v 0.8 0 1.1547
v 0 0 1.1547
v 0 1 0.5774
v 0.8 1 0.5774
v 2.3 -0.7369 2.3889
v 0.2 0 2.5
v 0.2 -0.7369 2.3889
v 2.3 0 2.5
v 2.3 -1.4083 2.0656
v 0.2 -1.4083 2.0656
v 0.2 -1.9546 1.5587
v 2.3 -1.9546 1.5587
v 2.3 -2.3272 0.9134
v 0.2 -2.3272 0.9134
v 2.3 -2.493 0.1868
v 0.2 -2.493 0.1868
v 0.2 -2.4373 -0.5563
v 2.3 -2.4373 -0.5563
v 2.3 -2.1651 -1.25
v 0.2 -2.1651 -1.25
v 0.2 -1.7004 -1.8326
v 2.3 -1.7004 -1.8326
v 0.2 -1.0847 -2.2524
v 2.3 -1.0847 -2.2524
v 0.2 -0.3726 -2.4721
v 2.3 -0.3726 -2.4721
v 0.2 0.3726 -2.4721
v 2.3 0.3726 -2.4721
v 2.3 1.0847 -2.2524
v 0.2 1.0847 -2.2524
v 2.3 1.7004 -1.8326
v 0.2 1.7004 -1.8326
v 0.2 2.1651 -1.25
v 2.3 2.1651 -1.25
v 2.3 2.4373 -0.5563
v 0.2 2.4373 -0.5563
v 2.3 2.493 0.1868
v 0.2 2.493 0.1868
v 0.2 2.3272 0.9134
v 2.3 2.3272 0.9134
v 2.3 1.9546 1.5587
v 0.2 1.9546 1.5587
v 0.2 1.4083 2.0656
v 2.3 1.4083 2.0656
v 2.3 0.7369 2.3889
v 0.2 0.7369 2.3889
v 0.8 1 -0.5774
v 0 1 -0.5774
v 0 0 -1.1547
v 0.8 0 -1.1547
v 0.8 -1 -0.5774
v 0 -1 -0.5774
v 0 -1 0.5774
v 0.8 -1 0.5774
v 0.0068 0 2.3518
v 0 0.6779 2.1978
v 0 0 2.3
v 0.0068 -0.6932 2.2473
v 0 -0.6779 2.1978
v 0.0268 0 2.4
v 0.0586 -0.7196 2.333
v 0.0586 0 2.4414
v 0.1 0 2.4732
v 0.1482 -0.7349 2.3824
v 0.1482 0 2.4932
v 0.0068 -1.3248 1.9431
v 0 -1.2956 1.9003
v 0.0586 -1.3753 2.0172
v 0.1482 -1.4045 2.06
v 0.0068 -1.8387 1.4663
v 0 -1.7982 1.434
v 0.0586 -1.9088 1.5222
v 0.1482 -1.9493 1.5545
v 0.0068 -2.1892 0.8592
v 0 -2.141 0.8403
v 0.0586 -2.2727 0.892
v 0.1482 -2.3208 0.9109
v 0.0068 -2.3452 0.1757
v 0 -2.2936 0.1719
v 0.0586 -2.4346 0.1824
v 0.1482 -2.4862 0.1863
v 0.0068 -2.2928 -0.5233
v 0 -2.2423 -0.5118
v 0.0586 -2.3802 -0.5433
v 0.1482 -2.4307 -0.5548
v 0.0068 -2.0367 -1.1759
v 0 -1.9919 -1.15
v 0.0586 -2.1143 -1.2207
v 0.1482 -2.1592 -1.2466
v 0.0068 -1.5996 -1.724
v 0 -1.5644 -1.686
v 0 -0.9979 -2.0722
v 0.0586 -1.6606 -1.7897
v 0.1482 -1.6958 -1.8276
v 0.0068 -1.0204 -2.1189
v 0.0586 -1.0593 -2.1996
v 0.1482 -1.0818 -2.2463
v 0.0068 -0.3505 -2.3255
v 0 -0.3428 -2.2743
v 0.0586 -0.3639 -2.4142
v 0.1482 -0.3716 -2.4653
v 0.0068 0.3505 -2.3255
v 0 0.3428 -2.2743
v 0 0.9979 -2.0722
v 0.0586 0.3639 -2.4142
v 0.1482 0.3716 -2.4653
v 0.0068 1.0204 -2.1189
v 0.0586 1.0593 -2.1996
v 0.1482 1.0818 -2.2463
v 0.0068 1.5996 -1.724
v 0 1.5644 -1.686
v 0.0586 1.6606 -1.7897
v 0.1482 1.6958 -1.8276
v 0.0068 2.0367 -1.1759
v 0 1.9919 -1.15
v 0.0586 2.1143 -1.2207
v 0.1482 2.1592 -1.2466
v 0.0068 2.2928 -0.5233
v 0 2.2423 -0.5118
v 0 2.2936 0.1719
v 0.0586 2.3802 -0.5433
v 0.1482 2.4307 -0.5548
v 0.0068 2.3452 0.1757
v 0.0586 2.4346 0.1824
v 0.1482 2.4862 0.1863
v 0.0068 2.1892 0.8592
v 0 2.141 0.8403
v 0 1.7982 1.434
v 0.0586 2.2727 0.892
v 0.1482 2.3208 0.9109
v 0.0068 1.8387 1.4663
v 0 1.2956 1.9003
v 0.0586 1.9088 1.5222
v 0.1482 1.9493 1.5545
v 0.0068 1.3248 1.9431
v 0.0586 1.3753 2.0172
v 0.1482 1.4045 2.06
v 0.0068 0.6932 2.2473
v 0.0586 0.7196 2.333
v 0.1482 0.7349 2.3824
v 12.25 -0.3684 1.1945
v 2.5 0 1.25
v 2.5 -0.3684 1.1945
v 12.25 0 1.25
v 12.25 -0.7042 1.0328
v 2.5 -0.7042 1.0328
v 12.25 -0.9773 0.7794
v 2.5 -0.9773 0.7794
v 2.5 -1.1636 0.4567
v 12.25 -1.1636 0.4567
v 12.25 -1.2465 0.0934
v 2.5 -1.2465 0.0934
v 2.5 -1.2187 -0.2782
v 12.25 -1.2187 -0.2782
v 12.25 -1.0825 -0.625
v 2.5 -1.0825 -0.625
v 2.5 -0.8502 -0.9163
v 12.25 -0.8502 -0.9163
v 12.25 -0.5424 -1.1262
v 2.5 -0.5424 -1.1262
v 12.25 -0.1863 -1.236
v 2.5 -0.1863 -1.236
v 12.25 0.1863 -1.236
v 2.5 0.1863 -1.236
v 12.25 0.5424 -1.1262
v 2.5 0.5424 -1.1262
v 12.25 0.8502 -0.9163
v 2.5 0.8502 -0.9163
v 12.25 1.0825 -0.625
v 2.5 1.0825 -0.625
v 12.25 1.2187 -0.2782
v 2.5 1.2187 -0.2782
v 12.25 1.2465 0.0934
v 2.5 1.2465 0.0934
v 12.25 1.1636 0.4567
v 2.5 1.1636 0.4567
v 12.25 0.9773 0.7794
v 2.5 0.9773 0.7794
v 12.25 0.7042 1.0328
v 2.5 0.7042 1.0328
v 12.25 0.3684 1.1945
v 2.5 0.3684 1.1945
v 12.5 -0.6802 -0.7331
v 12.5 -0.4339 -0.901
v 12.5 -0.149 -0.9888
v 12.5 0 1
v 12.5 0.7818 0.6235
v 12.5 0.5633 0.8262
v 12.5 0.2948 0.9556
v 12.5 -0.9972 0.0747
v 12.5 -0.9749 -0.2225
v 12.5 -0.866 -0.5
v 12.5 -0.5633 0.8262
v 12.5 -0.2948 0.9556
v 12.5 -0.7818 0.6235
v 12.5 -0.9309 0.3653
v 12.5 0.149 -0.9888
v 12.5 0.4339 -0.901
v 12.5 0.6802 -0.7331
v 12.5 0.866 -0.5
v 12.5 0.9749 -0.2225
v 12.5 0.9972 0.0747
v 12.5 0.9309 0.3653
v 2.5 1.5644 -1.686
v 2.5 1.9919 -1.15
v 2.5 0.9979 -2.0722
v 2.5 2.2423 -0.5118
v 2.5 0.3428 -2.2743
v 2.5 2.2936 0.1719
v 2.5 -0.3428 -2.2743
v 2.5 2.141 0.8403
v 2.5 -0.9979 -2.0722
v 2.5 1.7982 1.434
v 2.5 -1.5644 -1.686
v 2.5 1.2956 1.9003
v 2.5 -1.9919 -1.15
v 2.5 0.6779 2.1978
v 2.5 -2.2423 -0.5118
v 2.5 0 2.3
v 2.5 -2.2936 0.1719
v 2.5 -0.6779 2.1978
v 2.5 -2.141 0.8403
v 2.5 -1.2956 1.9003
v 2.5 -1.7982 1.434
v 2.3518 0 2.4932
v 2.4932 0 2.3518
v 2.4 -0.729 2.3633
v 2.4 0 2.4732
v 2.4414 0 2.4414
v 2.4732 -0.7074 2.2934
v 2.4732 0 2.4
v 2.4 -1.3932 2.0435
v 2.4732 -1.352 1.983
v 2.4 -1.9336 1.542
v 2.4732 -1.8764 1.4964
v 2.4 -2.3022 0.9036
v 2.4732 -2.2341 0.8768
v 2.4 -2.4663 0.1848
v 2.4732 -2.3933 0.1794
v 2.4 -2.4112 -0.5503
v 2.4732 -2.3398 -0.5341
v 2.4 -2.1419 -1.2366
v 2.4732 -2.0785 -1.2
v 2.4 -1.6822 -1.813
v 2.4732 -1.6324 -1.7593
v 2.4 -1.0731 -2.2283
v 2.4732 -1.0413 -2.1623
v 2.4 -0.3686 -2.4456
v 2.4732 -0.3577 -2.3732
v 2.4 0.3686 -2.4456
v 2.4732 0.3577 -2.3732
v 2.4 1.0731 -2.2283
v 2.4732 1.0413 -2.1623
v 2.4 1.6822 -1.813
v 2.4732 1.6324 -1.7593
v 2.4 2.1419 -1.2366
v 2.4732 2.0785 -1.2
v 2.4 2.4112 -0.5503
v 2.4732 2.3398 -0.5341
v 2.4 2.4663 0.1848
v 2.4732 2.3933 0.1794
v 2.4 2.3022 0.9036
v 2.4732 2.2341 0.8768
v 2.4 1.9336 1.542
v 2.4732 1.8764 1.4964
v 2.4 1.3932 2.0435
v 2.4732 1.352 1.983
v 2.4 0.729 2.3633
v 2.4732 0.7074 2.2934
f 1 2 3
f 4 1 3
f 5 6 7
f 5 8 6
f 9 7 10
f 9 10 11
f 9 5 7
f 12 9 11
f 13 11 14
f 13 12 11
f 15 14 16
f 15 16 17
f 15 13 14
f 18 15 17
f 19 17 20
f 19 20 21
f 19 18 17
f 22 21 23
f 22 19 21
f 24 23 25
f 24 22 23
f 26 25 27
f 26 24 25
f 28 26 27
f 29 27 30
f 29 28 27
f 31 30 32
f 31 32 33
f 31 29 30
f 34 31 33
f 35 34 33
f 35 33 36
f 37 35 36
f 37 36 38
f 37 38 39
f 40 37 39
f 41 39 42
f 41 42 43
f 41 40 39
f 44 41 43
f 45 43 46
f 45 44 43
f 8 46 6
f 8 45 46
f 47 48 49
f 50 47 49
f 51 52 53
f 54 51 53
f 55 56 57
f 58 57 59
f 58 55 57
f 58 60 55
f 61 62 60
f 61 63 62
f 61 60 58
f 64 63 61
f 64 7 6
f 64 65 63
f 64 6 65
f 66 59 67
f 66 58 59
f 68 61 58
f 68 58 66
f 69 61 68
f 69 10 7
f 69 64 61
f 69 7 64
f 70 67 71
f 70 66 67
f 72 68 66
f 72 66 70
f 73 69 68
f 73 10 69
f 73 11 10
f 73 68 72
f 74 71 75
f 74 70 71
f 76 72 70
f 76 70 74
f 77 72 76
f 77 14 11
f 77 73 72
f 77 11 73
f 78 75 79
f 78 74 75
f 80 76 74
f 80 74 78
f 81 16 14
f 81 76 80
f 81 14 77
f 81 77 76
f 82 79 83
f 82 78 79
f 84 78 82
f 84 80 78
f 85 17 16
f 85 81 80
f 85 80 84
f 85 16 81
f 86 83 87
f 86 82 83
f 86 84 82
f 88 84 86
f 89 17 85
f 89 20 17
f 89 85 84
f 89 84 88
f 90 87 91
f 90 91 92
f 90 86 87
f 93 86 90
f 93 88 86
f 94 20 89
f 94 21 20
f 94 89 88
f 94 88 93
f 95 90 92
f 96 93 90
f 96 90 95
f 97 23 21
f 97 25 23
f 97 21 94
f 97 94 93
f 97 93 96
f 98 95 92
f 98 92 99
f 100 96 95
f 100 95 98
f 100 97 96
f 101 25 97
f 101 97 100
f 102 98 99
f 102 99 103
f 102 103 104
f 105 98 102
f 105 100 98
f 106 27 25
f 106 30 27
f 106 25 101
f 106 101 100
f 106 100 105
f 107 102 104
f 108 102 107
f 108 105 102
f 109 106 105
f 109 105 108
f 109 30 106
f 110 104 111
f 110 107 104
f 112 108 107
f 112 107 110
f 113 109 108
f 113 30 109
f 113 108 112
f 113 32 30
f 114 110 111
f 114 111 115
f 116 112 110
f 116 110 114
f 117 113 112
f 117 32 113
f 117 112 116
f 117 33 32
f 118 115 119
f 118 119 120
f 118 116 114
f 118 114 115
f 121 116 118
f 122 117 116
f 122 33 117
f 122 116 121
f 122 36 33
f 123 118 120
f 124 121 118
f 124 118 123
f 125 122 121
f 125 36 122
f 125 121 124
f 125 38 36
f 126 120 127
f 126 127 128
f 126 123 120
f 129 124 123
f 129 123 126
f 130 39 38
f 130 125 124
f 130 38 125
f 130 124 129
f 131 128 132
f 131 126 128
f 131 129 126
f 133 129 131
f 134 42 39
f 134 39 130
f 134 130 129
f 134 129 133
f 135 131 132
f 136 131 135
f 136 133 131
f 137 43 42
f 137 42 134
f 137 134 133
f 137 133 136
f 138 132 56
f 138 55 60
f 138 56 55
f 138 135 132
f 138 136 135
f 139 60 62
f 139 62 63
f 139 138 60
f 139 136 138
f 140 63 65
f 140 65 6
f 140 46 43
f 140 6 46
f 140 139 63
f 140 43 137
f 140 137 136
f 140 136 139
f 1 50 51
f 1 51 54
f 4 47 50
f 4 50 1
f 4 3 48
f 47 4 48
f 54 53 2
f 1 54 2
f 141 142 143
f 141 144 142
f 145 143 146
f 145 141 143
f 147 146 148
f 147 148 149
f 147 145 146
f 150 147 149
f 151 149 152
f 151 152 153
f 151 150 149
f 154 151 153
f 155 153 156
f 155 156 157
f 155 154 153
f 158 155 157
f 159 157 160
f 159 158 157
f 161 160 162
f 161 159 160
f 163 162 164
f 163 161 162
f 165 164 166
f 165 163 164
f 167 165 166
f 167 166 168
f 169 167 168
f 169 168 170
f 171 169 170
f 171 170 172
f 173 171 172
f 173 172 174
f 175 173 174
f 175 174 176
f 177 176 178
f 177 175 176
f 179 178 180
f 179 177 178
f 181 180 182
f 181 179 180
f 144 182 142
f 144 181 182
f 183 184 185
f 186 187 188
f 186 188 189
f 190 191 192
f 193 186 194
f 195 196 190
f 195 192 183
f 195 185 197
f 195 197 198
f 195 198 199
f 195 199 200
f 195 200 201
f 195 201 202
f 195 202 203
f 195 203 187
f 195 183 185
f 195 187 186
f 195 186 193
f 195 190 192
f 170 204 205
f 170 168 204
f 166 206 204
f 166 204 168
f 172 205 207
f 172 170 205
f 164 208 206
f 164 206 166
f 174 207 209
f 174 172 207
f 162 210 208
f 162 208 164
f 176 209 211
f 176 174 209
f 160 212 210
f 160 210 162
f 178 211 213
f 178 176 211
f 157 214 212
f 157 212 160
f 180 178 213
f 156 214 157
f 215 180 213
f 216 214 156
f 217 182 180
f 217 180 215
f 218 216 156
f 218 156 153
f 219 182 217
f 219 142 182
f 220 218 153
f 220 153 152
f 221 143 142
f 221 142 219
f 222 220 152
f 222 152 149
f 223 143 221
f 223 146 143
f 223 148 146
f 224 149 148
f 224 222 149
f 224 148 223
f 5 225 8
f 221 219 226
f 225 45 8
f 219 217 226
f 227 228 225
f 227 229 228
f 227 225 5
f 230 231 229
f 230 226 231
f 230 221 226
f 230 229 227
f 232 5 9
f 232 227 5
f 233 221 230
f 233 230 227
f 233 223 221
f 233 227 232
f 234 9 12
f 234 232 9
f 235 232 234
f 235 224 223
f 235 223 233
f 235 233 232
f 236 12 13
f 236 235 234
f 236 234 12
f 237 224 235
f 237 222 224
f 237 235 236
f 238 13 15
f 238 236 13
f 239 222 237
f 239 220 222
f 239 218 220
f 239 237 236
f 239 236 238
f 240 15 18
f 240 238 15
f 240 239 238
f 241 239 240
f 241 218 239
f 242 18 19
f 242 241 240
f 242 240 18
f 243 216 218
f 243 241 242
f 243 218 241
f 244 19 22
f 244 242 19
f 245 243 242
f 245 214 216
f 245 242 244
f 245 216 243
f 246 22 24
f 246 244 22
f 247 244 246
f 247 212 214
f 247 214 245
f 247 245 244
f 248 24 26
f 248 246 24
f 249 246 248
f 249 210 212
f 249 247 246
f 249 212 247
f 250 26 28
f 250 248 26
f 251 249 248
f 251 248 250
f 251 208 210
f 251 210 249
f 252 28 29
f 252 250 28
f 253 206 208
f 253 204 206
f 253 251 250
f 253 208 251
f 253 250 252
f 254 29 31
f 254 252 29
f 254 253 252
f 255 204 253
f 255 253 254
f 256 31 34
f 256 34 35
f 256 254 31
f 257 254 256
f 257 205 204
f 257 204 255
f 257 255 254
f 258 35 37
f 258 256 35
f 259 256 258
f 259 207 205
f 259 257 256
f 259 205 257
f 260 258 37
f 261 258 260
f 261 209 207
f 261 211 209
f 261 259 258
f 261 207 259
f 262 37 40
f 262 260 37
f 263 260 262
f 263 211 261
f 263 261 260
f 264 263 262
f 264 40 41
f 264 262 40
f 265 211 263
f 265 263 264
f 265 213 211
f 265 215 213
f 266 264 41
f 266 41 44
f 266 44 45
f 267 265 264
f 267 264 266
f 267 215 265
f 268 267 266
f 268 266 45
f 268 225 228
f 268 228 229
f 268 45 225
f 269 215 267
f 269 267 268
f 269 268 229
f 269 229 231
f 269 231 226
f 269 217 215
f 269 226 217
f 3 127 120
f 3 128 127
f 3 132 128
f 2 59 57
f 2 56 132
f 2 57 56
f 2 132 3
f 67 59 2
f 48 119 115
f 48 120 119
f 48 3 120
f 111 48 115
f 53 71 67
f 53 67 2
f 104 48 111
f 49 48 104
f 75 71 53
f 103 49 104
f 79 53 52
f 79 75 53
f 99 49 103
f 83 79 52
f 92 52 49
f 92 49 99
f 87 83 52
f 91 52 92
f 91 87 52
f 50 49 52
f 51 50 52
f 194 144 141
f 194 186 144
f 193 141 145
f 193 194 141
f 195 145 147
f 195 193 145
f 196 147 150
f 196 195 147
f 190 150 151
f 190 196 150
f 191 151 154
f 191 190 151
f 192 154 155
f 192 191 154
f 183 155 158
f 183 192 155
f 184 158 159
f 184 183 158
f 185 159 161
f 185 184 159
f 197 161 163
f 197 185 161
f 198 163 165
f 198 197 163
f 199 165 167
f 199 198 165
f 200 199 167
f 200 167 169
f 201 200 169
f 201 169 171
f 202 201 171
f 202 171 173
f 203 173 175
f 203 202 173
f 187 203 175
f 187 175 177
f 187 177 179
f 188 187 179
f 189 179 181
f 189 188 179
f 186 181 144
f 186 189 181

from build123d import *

# Parameters (mm, degrees)
CUT_EXTRUDE1_DEPTH = 0.8


with BuildPart() as part:
    # Sketch2 → Revolve1 (revolve)
    with BuildSketch(Plane.XY, mode=Mode.PRIVATE) as revolve1_sk:
        with BuildLine():
            Line((0, 0), (0, 2.3))
            ThreePointArc((0, 2.3), (0.058578644, 2.441421356), (0.2, 2.5))
            Line((0.2, 2.5), (2.3, 2.5))
            ThreePointArc((2.3, 2.5), (2.441421356, 2.441421356), (2.5, 2.3))
            Line((2.5, 2.3), (2.5, 1.25))
            Line((2.5, 1.25), (12.25, 1.25))
            Line((12.25, 1.25), (12.5, 1))
            Line((12.5, 1), (12.5, 0))
            Line((12.5, 0), (0, 0))
        make_face()
    revolve(revolve1_sk.sketch.rotate(Axis((-2.281841559, 0, 0), (1, 0, 0)), 90), axis=Axis((-2.281841559, 0, 0), (1, 0, 0)))

    # Sketch3 → Cut-Extrude1 (cut)
    with BuildSketch(Plane.ZY):
        Polygon((0.577350269, -1), (1.154700538, 0), (0.577350269, 1), (-0.577350269, 1), (-1.154700538, 0), (-0.577350269, -1), align=None)
    extrude(amount=-CUT_EXTRUDE1_DEPTH, mode=Mode.SUBTRACT)


solid = part.part
